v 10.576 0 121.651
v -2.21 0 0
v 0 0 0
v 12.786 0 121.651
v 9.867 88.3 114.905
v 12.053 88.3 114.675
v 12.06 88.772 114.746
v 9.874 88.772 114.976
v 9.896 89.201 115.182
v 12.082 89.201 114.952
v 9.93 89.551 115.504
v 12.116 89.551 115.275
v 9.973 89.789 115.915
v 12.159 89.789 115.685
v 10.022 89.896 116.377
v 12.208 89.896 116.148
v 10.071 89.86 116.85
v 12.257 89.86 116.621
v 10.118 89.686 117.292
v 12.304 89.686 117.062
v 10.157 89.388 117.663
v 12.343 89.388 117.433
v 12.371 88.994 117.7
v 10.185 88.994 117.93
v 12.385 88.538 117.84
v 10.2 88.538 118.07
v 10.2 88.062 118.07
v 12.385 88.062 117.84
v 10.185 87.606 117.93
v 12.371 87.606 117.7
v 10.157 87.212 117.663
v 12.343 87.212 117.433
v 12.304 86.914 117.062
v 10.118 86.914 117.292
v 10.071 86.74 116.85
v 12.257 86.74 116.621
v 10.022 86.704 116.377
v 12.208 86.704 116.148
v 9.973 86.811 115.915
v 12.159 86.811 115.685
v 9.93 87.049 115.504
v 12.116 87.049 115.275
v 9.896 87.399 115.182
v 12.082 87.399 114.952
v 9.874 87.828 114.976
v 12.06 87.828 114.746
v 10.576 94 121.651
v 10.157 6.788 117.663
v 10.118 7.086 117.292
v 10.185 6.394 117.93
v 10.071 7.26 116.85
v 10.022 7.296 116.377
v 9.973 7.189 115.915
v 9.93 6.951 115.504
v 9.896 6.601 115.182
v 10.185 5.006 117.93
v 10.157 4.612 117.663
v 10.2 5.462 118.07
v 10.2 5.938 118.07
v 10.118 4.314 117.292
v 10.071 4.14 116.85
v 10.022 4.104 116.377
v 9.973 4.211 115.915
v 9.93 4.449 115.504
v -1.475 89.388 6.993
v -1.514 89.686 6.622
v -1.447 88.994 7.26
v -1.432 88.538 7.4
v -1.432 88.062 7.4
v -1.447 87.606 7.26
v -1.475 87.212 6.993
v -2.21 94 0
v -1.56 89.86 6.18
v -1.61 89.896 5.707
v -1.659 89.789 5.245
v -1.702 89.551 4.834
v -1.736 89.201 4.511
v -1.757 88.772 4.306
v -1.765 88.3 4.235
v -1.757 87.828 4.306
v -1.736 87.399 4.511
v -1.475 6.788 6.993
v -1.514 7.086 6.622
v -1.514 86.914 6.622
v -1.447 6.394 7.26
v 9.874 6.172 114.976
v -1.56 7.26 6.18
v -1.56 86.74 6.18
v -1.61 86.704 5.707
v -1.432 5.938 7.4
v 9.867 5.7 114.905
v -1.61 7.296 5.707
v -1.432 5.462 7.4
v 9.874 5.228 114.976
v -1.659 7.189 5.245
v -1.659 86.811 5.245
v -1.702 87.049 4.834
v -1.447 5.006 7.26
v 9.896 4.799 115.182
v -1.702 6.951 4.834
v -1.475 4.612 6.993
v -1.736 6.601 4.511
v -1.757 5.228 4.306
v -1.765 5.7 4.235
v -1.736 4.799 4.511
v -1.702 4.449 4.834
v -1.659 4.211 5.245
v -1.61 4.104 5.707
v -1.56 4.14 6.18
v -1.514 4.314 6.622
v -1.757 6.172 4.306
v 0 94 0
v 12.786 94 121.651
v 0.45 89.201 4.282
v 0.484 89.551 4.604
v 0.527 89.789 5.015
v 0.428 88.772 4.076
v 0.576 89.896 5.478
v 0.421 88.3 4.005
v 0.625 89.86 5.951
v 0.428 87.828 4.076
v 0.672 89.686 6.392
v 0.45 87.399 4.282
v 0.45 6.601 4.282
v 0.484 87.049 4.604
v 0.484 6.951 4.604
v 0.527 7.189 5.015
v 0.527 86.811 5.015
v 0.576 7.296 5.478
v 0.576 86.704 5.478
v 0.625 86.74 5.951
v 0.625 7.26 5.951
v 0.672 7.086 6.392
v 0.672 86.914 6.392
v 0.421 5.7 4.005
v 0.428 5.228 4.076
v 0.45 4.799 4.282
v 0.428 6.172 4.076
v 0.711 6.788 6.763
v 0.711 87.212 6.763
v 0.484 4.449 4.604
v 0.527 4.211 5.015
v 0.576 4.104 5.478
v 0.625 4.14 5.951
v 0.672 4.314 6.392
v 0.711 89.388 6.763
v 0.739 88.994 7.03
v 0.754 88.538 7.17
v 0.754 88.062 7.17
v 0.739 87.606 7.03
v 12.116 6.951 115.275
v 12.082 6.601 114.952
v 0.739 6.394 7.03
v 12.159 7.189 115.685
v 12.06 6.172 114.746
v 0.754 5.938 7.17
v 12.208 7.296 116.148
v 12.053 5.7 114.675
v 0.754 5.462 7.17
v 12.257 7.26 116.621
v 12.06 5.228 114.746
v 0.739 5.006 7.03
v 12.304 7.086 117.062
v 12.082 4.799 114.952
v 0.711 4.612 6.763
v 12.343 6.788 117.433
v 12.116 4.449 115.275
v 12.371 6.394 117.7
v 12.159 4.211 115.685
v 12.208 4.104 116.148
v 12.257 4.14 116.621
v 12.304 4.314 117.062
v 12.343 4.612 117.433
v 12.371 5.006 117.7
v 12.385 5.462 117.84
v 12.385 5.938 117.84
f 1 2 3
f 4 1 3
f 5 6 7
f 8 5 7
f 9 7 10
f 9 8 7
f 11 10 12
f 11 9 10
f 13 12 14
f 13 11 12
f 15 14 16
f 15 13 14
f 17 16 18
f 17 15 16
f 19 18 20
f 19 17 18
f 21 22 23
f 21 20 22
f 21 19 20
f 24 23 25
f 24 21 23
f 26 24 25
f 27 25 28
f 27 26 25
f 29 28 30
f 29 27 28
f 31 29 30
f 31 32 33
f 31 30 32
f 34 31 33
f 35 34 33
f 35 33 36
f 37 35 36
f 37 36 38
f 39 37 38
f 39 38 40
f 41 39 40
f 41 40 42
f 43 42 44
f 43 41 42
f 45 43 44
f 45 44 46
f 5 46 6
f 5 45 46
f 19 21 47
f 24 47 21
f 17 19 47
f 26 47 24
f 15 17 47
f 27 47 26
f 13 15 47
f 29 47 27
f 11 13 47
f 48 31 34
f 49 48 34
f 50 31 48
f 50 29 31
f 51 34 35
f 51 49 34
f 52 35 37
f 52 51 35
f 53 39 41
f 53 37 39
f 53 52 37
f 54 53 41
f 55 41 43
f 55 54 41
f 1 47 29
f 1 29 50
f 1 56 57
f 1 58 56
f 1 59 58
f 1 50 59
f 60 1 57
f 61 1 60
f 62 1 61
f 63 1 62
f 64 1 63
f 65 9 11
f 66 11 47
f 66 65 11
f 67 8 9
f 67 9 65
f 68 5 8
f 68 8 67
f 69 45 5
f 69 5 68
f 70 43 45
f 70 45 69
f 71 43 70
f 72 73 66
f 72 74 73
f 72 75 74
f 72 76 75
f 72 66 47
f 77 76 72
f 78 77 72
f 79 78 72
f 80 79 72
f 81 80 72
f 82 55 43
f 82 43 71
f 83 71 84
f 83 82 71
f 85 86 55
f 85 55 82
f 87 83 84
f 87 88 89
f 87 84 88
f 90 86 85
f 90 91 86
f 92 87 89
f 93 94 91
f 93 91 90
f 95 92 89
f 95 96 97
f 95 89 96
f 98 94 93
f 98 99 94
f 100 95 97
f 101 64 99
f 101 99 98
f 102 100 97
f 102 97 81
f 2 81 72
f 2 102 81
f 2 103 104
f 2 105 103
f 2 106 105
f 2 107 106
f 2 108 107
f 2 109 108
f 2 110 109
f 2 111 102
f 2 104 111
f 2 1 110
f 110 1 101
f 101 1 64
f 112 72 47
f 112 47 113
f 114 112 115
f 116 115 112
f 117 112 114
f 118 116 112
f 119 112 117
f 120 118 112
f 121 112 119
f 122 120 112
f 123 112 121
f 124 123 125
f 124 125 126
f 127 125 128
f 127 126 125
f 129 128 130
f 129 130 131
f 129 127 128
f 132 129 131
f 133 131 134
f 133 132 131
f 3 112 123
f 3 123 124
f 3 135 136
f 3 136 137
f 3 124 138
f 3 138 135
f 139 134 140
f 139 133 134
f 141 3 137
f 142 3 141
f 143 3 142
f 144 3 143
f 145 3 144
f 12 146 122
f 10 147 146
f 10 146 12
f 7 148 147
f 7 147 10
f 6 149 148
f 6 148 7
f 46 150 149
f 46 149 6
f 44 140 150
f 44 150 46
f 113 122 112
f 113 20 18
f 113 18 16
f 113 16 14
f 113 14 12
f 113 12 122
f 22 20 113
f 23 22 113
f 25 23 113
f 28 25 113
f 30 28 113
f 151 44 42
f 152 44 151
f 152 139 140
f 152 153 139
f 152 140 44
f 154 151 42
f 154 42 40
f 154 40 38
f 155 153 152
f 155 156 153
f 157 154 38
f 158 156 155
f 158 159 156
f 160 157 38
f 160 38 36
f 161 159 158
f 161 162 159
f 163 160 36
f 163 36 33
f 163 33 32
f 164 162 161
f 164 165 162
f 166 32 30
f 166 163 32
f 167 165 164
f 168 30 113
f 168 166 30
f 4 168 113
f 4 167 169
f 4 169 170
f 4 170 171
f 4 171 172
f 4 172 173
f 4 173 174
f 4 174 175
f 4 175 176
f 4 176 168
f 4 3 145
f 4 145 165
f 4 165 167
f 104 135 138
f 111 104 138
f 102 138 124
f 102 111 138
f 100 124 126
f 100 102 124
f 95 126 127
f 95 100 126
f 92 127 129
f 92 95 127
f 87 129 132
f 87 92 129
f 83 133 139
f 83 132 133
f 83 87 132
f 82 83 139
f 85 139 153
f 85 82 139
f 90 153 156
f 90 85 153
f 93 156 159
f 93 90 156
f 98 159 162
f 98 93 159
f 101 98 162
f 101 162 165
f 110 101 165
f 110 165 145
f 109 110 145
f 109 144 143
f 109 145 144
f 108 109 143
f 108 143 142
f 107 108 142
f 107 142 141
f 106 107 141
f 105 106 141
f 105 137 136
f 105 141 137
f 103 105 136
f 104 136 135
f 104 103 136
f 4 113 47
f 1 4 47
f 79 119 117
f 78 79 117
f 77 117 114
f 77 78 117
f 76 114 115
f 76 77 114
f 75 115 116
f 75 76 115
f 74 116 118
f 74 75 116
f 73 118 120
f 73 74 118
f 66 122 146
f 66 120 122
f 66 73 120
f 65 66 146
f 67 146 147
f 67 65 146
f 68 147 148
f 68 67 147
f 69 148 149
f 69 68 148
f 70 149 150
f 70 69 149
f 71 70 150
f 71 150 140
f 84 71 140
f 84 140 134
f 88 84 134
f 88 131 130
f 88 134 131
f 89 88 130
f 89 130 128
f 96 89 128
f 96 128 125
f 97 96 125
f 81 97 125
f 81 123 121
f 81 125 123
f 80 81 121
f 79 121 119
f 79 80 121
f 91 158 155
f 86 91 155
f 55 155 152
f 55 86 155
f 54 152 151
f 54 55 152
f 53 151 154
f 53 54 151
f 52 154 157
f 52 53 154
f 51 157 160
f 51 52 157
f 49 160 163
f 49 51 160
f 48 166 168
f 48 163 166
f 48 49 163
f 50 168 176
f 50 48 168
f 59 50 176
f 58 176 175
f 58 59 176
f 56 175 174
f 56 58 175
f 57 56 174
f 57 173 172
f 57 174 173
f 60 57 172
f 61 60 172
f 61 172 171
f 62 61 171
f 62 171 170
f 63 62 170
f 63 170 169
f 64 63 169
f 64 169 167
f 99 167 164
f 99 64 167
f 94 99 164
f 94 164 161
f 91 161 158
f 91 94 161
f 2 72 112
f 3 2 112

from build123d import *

# Parameters (mm, degrees)
CYLINDER021_R               = 1.6
CYLINDER021_DEPTH           = 4
CYLINDER021_PLACEMENT_ANGLE = 96
CYLINDER022_R               = 1.6
CYLINDER022_DEPTH           = 4
CYLINDER022_PLACEMENT_ANGLE = 96
CYLINDER023_R               = 1.6
CYLINDER023_DEPTH           = 4
CYLINDER023_PLACEMENT_ANGLE = 96
CYLINDER020_R               = 1.6
CYLINDER020_DEPTH           = 4
CYLINDER020_PLACEMENT_ANGLE = 96
PAD_DEPTH                   = 94


with BuildPart() as loch2:
    # Cylinder021 → Cylinder021 (new body)
    with BuildSketch(Plane.XY):
        Circle(CYLINDER021_R)
    extrude(amount=CYLINDER021_DEPTH)


with BuildPart() as loch2_1:
    # Cylinder021 placement: moved
    add(loch2.part.moved(Location((10, 88.3, 116.5))).rotate(Axis((10, 88.3, 116.5), (0, 1, 0)), CYLINDER021_PLACEMENT_ANGLE))


with BuildPart() as loch3:
    # Cylinder022 → Cylinder022 (new body)
    with BuildSketch(Plane.XY):
        Circle(CYLINDER022_R)
    extrude(amount=CYLINDER022_DEPTH)


with BuildPart() as loch3_1:
    # Cylinder022 placement: moved
    add(loch3.part.moved(Location((-2.3, 88.3, 5.9))).rotate(Axis((-2.3, 88.3, 5.9), (0, 1, 0)), CYLINDER022_PLACEMENT_ANGLE))


with BuildPart() as loch4:
    # Cylinder023 → Cylinder023 (new body)
    with BuildSketch(Plane.XY):
        Circle(CYLINDER023_R)
    extrude(amount=CYLINDER023_DEPTH)


with BuildPart() as loch4_1:
    # Cylinder023 placement: moved
    add(loch4.part.moved(Location((10, 5.7, 116.5))).rotate(Axis((10, 5.7, 116.5), (0, 1, 0)), CYLINDER023_PLACEMENT_ANGLE))


with BuildPart() as l_cher:
    # Cylinder020 → Cylinder020 (new body)
    with BuildSketch(Plane.XY):
        Circle(CYLINDER020_R)
    extrude(amount=CYLINDER020_DEPTH)


with BuildPart() as l_cher_1:
    # Cylinder020 placement: moved
    add(l_cher.part.moved(Location((-2.3, 5.7, 5.9))).rotate(Axis((-2.3, 5.7, 5.9), (0, 1, 0)), CYLINDER020_PLACEMENT_ANGLE))

    # Fusion013: union Loch2, Loch3, Loch4
    add(loch2_1.part)
    add(loch3_1.part)
    add(loch4_1.part)


with BuildPart() as ad_deckel_loecher:
    # Sketch003 → Pad (new body)
    with BuildSketch(Plane.XZ):
        Polygon((0, 0), (12.786083, 121.651457), (10.576083, 121.651457), (-2.21, 0), align=None)
    extrude(amount=-PAD_DEPTH)

    # Cut028: cut Löcher
    add(l_cher_1.part, mode=Mode.SUBTRACT)


solid = ad_deckel_loecher.part
